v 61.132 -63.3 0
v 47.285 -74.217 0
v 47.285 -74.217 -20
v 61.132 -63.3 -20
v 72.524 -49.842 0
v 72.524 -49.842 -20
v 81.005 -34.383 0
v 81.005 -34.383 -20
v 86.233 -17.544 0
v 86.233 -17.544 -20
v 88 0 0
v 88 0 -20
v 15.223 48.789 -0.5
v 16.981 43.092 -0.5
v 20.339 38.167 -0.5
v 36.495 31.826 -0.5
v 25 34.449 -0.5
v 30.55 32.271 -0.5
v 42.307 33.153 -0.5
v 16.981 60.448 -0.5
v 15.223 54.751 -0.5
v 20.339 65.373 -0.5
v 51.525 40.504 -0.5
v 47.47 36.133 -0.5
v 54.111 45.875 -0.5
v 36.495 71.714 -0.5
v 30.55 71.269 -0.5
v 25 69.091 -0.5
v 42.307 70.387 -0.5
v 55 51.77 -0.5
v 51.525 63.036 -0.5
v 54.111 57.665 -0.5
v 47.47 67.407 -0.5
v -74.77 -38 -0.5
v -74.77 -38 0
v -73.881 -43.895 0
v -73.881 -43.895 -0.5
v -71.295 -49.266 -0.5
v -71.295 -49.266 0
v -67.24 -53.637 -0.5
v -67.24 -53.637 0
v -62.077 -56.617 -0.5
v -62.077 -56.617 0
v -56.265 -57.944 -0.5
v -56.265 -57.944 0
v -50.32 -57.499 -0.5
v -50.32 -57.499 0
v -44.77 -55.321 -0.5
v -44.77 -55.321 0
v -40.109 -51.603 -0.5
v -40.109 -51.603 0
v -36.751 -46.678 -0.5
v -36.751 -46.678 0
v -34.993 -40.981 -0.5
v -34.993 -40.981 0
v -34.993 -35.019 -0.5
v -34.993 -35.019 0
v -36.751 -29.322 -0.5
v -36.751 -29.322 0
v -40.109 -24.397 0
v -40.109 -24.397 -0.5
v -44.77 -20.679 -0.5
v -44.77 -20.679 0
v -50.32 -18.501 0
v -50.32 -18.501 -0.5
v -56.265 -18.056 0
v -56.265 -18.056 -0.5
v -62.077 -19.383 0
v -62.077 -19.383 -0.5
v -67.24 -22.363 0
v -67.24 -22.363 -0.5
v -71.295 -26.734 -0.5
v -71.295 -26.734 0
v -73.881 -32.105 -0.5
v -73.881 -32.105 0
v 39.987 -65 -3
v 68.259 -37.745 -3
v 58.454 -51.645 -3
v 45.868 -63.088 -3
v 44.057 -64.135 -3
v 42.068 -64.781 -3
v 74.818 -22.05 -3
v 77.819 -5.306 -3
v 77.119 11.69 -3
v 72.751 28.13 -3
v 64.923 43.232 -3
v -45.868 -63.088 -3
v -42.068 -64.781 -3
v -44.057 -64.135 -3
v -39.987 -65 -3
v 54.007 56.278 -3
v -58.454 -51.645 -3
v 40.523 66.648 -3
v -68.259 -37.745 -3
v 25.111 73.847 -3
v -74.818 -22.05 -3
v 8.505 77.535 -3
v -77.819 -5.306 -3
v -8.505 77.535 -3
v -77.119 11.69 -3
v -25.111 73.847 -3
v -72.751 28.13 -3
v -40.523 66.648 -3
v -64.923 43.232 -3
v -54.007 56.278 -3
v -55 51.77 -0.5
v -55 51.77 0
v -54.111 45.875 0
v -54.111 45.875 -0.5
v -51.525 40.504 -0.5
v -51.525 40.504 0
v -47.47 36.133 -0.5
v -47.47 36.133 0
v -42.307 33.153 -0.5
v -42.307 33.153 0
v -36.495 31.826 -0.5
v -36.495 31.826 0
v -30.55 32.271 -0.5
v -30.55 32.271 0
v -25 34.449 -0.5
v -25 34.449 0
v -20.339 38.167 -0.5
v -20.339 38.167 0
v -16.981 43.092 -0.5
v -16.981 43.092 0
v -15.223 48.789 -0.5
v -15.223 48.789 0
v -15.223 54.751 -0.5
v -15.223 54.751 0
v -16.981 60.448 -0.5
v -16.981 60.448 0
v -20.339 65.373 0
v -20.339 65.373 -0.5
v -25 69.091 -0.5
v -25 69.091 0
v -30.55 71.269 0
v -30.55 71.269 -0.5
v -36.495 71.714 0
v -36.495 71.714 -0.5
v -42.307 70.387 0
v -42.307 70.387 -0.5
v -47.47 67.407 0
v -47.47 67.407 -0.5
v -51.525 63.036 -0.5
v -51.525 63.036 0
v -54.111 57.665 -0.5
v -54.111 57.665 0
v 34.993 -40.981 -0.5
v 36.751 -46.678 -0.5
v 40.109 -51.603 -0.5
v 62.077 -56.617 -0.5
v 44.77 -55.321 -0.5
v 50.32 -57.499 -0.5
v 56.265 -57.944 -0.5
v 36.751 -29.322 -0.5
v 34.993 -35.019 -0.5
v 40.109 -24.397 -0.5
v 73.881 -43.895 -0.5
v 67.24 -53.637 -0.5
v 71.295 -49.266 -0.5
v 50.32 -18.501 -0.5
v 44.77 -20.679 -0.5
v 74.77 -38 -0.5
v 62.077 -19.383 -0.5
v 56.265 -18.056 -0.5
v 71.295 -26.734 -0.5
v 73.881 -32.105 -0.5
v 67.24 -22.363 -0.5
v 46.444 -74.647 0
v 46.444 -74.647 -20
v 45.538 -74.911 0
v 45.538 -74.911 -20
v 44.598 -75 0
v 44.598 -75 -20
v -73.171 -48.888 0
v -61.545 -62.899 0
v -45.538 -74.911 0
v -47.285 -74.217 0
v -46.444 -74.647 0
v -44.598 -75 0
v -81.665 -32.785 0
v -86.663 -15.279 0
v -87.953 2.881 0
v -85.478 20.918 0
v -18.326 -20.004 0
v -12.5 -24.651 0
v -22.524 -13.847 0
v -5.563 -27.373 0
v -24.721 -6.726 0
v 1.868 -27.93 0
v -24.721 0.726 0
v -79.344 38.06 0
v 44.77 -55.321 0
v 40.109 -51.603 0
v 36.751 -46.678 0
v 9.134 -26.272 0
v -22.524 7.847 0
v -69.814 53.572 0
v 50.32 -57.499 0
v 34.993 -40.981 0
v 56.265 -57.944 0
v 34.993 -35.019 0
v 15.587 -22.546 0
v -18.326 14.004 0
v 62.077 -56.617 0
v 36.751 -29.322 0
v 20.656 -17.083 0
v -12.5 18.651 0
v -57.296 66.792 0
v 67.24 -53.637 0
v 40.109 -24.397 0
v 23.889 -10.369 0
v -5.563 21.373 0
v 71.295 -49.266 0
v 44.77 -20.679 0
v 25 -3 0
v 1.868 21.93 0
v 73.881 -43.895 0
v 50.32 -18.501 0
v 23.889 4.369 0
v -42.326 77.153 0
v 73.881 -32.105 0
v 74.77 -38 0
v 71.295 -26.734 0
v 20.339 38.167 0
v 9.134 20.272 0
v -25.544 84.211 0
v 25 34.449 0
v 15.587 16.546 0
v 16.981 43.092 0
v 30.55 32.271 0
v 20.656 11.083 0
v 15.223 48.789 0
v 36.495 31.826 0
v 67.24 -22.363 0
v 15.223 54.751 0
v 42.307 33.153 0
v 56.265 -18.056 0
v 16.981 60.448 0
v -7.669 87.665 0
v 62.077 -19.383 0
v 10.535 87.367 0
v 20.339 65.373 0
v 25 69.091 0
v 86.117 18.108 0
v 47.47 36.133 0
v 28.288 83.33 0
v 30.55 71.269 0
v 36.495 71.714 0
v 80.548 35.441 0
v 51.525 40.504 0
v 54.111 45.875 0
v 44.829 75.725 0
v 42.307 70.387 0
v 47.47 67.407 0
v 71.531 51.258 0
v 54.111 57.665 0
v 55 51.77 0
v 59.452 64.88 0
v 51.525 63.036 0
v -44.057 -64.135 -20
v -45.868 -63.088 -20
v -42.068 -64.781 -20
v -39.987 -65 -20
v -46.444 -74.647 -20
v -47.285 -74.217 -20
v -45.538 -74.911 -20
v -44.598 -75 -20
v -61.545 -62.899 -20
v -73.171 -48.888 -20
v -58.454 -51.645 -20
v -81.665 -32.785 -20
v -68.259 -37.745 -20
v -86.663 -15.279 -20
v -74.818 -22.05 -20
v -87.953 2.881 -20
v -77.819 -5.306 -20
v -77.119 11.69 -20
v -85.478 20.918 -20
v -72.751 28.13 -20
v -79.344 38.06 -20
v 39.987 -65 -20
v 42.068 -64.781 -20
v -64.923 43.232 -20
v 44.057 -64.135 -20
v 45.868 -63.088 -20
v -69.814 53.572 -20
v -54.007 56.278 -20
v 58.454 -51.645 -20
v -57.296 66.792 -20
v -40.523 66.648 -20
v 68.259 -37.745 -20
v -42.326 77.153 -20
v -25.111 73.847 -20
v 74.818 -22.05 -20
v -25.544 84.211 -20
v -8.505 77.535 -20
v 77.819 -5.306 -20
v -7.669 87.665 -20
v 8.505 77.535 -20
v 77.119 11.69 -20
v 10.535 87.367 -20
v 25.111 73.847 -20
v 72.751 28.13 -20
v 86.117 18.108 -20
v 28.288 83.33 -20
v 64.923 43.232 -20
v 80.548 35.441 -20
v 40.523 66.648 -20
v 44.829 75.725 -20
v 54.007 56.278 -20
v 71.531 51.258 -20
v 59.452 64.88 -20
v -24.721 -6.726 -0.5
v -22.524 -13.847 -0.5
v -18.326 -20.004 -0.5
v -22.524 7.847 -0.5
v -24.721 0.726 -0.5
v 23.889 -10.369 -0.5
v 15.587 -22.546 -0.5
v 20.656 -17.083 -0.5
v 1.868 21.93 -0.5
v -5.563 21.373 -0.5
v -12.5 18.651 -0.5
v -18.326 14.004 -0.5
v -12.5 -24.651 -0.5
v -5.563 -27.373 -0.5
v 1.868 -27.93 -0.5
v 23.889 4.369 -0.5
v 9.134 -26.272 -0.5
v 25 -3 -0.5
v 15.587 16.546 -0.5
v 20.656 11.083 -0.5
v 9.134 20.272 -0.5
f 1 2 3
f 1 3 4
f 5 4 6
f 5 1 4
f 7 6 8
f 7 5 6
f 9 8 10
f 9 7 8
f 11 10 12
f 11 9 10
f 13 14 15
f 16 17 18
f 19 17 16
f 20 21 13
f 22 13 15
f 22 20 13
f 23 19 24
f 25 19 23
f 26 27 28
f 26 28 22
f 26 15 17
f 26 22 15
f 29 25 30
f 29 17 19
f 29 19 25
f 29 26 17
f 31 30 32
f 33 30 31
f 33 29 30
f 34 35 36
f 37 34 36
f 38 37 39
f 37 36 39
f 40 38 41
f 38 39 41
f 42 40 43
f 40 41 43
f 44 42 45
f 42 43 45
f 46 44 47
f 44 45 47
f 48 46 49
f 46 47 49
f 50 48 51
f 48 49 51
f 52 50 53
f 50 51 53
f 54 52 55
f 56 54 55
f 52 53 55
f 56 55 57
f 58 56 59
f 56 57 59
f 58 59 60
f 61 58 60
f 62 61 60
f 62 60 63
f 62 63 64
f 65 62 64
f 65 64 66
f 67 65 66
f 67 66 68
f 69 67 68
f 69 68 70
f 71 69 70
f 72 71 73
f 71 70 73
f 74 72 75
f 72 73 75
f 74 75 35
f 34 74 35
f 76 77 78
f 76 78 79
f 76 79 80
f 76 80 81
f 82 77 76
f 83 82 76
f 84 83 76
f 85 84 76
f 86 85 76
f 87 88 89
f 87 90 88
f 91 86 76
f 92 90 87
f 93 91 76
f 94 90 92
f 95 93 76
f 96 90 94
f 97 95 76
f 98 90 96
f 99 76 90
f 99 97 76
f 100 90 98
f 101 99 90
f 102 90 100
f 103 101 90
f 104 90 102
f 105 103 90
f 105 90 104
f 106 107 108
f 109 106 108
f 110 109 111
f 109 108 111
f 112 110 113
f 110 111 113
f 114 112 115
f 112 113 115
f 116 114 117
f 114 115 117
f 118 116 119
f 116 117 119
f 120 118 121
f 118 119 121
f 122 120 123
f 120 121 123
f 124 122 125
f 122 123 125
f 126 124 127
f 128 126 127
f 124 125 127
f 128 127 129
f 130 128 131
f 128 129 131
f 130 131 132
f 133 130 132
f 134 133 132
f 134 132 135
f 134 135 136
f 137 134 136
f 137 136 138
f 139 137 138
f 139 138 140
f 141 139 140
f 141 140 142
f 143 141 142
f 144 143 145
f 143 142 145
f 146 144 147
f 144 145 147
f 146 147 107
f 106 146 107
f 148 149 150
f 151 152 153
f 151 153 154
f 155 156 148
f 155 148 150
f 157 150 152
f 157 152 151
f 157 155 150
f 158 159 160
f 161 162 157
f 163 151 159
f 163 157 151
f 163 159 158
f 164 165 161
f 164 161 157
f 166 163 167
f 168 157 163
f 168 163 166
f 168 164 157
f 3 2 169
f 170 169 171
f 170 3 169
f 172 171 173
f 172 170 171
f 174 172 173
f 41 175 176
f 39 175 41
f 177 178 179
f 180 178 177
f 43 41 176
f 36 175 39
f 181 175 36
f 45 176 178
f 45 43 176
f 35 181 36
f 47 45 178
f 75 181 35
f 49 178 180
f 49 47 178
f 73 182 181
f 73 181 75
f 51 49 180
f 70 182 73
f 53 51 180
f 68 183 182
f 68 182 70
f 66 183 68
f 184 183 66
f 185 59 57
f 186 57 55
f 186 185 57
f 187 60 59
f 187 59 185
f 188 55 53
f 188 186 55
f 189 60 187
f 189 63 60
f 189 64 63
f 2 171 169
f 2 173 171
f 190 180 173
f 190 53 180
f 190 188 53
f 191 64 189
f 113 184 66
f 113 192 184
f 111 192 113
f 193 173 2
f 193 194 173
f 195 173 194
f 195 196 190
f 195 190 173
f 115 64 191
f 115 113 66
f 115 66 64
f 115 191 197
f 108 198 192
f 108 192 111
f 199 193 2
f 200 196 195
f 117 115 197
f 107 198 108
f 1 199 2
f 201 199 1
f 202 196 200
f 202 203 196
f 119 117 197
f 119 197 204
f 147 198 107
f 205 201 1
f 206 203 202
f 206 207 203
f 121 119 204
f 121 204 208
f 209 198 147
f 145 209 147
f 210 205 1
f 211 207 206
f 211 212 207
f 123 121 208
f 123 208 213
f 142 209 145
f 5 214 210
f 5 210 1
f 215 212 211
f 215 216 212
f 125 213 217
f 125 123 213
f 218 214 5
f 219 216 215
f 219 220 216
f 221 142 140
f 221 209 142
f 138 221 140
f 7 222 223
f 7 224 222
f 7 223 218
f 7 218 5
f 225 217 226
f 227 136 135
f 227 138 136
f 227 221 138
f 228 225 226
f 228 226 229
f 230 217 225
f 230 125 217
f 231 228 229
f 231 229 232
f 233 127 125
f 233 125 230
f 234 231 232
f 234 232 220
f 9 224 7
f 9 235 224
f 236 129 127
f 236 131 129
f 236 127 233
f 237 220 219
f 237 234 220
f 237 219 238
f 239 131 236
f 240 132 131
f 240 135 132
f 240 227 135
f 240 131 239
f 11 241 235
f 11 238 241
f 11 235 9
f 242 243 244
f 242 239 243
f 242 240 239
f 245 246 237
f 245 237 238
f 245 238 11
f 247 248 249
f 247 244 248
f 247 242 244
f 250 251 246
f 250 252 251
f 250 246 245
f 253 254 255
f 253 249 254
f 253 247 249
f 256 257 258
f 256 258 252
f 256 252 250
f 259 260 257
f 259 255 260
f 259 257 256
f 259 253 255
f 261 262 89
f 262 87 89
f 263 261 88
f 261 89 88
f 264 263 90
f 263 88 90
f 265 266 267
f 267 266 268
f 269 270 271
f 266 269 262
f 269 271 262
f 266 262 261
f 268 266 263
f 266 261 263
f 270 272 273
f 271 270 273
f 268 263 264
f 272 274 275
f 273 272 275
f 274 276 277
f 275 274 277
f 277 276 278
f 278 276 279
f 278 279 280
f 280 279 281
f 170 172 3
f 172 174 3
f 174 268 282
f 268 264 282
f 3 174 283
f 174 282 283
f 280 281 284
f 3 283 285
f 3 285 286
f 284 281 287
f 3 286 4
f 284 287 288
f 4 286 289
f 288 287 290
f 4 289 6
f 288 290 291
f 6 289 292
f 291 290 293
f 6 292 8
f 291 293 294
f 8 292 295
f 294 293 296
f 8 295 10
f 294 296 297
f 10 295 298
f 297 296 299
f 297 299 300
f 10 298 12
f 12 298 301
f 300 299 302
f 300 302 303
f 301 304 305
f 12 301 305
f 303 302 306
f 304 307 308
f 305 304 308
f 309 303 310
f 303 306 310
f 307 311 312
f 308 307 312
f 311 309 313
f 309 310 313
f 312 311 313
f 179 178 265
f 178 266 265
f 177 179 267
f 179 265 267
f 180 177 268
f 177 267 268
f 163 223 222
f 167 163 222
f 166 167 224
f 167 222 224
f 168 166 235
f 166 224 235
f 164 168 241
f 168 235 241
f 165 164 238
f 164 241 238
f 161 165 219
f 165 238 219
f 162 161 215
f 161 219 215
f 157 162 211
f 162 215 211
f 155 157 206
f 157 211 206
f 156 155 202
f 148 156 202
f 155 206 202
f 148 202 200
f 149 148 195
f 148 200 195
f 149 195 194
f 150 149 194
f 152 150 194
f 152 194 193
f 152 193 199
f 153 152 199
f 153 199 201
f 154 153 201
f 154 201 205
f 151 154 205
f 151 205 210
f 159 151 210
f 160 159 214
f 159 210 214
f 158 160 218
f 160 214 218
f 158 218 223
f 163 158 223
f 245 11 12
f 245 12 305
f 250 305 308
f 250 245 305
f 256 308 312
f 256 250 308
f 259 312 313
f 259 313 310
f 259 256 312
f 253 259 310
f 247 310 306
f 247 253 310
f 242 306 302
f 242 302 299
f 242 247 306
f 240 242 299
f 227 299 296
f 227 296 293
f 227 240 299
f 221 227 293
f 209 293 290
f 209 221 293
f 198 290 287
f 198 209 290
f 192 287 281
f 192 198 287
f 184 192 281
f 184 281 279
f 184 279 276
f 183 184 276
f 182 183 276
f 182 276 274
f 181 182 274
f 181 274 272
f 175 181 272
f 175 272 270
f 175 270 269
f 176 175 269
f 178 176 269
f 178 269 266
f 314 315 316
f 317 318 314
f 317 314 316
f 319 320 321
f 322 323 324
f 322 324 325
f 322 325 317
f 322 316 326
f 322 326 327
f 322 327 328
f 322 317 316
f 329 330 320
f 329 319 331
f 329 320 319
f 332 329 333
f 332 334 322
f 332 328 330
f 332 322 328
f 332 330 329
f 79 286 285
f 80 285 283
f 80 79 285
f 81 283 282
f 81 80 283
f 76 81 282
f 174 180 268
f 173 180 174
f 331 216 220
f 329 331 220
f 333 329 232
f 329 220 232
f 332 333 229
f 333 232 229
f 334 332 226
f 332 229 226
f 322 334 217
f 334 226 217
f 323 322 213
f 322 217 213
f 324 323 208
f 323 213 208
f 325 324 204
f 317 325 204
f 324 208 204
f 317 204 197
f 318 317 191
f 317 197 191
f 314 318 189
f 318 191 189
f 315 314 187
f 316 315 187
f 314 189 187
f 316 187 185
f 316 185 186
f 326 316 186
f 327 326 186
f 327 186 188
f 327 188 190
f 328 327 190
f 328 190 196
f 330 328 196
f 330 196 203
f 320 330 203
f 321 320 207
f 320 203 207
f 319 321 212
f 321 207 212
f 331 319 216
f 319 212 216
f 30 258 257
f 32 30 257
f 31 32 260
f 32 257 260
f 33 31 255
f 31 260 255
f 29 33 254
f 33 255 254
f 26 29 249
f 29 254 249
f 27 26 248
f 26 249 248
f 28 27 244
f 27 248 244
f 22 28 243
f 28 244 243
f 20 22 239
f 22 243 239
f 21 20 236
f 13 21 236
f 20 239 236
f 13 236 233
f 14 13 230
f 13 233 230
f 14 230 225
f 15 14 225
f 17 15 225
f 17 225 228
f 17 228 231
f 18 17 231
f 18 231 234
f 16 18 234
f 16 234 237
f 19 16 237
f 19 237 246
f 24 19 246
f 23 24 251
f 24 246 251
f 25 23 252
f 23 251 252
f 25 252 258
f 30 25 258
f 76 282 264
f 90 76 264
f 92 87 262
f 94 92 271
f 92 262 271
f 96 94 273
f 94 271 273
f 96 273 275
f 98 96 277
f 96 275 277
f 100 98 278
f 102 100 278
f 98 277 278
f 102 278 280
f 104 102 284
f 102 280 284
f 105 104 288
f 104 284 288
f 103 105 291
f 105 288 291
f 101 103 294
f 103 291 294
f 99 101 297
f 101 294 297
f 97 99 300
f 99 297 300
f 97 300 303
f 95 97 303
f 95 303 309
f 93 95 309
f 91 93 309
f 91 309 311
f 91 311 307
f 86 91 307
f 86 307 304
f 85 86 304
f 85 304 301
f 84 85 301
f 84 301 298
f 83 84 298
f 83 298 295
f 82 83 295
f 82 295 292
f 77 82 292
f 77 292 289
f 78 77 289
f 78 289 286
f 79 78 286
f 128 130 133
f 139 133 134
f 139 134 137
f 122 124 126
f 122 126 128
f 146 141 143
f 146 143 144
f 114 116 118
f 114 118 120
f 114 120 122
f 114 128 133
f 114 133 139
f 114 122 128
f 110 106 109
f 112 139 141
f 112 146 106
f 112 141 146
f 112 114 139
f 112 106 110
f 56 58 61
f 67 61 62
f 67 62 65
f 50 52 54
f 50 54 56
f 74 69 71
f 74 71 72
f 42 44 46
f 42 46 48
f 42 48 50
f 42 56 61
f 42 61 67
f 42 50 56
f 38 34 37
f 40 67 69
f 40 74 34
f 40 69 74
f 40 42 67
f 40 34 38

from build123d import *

# Parameters (mm, degrees)
BOSS_EXTRUDE1_DEPTH = 20
CUT_EXTRUDE1_DEPTH  = 17
SKETCH4_R           = 25
SKETCH4_R_2         = 20
CUT_EXTRUDE2_DEPTH  = 0.5
FILLET1_R           = 10
FILLET2_R           = 5


with BuildPart() as part:
    # Sketch2 → Boss-Extrude1 (new body)
    with BuildSketch(Plane.XY):
        with BuildLine():
            ThreePointArc((88, 0), (-42.971685161, 76.794754212), (-46.032597146, -75))
            Line((-46.032597146, -75), (46.032597146, -75))
            ThreePointArc((46.032597146, -75), (76.794754212, -42.971685161), (88, 0))
        make_face()
    extrude(amount=-BOSS_EXTRUDE1_DEPTH)

    # Sketch3 → Cut-Extrude1 (cut)
    with BuildSketch(Plane(origin=(0, 0, -20), x_dir=(-1, 0, 0), z_dir=(0, 0, -1))):
        with BuildLine():
            Line((-43.116122275, -65), (43.116122275, -65))
            ThreePointArc((43.116122275, -65), (0, 78), (-43.116122275, -65))
        make_face()
    extrude(amount=-CUT_EXTRUDE1_DEPTH, mode=Mode.SUBTRACT)

    # Sketch4 → Cut-Extrude2 (cut)
    with BuildSketch(Plane.XY):
        with Locations((0, -3)):
            Circle(SKETCH4_R)
        with Locations(Location((-54.77, -38, 0), (0, 0, 180))):
            Circle(SKETCH4_R_2)
        with Locations((35, 51.77)):
            Circle(SKETCH4_R_2)
        with Locations((54.77, -38)):
            Circle(SKETCH4_R_2)
        with Locations(Location((-35, 51.77, 0), (0, 0, 180))):
            Circle(SKETCH4_R_2)
    extrude(amount=-CUT_EXTRUDE2_DEPTH, mode=Mode.SUBTRACT)

    # Fillet1
    fillet1_edges = [part.edges().sort_by_distance(p)[0] for p in [
        (43.116122275, -65, -11.5),
        (-43.116122275, -65, -11.5),
    ]]
    fillet(fillet1_edges, radius=FILLET1_R)

    # Fillet2
    fillet2_edges = [part.edges().sort_by_distance(p)[0] for p in [
        (-46.032597146, -75, -10),
        (46.032597146, -75, -10),
    ]]
    fillet(fillet2_edges, radius=FILLET2_R)


solid = part.part
